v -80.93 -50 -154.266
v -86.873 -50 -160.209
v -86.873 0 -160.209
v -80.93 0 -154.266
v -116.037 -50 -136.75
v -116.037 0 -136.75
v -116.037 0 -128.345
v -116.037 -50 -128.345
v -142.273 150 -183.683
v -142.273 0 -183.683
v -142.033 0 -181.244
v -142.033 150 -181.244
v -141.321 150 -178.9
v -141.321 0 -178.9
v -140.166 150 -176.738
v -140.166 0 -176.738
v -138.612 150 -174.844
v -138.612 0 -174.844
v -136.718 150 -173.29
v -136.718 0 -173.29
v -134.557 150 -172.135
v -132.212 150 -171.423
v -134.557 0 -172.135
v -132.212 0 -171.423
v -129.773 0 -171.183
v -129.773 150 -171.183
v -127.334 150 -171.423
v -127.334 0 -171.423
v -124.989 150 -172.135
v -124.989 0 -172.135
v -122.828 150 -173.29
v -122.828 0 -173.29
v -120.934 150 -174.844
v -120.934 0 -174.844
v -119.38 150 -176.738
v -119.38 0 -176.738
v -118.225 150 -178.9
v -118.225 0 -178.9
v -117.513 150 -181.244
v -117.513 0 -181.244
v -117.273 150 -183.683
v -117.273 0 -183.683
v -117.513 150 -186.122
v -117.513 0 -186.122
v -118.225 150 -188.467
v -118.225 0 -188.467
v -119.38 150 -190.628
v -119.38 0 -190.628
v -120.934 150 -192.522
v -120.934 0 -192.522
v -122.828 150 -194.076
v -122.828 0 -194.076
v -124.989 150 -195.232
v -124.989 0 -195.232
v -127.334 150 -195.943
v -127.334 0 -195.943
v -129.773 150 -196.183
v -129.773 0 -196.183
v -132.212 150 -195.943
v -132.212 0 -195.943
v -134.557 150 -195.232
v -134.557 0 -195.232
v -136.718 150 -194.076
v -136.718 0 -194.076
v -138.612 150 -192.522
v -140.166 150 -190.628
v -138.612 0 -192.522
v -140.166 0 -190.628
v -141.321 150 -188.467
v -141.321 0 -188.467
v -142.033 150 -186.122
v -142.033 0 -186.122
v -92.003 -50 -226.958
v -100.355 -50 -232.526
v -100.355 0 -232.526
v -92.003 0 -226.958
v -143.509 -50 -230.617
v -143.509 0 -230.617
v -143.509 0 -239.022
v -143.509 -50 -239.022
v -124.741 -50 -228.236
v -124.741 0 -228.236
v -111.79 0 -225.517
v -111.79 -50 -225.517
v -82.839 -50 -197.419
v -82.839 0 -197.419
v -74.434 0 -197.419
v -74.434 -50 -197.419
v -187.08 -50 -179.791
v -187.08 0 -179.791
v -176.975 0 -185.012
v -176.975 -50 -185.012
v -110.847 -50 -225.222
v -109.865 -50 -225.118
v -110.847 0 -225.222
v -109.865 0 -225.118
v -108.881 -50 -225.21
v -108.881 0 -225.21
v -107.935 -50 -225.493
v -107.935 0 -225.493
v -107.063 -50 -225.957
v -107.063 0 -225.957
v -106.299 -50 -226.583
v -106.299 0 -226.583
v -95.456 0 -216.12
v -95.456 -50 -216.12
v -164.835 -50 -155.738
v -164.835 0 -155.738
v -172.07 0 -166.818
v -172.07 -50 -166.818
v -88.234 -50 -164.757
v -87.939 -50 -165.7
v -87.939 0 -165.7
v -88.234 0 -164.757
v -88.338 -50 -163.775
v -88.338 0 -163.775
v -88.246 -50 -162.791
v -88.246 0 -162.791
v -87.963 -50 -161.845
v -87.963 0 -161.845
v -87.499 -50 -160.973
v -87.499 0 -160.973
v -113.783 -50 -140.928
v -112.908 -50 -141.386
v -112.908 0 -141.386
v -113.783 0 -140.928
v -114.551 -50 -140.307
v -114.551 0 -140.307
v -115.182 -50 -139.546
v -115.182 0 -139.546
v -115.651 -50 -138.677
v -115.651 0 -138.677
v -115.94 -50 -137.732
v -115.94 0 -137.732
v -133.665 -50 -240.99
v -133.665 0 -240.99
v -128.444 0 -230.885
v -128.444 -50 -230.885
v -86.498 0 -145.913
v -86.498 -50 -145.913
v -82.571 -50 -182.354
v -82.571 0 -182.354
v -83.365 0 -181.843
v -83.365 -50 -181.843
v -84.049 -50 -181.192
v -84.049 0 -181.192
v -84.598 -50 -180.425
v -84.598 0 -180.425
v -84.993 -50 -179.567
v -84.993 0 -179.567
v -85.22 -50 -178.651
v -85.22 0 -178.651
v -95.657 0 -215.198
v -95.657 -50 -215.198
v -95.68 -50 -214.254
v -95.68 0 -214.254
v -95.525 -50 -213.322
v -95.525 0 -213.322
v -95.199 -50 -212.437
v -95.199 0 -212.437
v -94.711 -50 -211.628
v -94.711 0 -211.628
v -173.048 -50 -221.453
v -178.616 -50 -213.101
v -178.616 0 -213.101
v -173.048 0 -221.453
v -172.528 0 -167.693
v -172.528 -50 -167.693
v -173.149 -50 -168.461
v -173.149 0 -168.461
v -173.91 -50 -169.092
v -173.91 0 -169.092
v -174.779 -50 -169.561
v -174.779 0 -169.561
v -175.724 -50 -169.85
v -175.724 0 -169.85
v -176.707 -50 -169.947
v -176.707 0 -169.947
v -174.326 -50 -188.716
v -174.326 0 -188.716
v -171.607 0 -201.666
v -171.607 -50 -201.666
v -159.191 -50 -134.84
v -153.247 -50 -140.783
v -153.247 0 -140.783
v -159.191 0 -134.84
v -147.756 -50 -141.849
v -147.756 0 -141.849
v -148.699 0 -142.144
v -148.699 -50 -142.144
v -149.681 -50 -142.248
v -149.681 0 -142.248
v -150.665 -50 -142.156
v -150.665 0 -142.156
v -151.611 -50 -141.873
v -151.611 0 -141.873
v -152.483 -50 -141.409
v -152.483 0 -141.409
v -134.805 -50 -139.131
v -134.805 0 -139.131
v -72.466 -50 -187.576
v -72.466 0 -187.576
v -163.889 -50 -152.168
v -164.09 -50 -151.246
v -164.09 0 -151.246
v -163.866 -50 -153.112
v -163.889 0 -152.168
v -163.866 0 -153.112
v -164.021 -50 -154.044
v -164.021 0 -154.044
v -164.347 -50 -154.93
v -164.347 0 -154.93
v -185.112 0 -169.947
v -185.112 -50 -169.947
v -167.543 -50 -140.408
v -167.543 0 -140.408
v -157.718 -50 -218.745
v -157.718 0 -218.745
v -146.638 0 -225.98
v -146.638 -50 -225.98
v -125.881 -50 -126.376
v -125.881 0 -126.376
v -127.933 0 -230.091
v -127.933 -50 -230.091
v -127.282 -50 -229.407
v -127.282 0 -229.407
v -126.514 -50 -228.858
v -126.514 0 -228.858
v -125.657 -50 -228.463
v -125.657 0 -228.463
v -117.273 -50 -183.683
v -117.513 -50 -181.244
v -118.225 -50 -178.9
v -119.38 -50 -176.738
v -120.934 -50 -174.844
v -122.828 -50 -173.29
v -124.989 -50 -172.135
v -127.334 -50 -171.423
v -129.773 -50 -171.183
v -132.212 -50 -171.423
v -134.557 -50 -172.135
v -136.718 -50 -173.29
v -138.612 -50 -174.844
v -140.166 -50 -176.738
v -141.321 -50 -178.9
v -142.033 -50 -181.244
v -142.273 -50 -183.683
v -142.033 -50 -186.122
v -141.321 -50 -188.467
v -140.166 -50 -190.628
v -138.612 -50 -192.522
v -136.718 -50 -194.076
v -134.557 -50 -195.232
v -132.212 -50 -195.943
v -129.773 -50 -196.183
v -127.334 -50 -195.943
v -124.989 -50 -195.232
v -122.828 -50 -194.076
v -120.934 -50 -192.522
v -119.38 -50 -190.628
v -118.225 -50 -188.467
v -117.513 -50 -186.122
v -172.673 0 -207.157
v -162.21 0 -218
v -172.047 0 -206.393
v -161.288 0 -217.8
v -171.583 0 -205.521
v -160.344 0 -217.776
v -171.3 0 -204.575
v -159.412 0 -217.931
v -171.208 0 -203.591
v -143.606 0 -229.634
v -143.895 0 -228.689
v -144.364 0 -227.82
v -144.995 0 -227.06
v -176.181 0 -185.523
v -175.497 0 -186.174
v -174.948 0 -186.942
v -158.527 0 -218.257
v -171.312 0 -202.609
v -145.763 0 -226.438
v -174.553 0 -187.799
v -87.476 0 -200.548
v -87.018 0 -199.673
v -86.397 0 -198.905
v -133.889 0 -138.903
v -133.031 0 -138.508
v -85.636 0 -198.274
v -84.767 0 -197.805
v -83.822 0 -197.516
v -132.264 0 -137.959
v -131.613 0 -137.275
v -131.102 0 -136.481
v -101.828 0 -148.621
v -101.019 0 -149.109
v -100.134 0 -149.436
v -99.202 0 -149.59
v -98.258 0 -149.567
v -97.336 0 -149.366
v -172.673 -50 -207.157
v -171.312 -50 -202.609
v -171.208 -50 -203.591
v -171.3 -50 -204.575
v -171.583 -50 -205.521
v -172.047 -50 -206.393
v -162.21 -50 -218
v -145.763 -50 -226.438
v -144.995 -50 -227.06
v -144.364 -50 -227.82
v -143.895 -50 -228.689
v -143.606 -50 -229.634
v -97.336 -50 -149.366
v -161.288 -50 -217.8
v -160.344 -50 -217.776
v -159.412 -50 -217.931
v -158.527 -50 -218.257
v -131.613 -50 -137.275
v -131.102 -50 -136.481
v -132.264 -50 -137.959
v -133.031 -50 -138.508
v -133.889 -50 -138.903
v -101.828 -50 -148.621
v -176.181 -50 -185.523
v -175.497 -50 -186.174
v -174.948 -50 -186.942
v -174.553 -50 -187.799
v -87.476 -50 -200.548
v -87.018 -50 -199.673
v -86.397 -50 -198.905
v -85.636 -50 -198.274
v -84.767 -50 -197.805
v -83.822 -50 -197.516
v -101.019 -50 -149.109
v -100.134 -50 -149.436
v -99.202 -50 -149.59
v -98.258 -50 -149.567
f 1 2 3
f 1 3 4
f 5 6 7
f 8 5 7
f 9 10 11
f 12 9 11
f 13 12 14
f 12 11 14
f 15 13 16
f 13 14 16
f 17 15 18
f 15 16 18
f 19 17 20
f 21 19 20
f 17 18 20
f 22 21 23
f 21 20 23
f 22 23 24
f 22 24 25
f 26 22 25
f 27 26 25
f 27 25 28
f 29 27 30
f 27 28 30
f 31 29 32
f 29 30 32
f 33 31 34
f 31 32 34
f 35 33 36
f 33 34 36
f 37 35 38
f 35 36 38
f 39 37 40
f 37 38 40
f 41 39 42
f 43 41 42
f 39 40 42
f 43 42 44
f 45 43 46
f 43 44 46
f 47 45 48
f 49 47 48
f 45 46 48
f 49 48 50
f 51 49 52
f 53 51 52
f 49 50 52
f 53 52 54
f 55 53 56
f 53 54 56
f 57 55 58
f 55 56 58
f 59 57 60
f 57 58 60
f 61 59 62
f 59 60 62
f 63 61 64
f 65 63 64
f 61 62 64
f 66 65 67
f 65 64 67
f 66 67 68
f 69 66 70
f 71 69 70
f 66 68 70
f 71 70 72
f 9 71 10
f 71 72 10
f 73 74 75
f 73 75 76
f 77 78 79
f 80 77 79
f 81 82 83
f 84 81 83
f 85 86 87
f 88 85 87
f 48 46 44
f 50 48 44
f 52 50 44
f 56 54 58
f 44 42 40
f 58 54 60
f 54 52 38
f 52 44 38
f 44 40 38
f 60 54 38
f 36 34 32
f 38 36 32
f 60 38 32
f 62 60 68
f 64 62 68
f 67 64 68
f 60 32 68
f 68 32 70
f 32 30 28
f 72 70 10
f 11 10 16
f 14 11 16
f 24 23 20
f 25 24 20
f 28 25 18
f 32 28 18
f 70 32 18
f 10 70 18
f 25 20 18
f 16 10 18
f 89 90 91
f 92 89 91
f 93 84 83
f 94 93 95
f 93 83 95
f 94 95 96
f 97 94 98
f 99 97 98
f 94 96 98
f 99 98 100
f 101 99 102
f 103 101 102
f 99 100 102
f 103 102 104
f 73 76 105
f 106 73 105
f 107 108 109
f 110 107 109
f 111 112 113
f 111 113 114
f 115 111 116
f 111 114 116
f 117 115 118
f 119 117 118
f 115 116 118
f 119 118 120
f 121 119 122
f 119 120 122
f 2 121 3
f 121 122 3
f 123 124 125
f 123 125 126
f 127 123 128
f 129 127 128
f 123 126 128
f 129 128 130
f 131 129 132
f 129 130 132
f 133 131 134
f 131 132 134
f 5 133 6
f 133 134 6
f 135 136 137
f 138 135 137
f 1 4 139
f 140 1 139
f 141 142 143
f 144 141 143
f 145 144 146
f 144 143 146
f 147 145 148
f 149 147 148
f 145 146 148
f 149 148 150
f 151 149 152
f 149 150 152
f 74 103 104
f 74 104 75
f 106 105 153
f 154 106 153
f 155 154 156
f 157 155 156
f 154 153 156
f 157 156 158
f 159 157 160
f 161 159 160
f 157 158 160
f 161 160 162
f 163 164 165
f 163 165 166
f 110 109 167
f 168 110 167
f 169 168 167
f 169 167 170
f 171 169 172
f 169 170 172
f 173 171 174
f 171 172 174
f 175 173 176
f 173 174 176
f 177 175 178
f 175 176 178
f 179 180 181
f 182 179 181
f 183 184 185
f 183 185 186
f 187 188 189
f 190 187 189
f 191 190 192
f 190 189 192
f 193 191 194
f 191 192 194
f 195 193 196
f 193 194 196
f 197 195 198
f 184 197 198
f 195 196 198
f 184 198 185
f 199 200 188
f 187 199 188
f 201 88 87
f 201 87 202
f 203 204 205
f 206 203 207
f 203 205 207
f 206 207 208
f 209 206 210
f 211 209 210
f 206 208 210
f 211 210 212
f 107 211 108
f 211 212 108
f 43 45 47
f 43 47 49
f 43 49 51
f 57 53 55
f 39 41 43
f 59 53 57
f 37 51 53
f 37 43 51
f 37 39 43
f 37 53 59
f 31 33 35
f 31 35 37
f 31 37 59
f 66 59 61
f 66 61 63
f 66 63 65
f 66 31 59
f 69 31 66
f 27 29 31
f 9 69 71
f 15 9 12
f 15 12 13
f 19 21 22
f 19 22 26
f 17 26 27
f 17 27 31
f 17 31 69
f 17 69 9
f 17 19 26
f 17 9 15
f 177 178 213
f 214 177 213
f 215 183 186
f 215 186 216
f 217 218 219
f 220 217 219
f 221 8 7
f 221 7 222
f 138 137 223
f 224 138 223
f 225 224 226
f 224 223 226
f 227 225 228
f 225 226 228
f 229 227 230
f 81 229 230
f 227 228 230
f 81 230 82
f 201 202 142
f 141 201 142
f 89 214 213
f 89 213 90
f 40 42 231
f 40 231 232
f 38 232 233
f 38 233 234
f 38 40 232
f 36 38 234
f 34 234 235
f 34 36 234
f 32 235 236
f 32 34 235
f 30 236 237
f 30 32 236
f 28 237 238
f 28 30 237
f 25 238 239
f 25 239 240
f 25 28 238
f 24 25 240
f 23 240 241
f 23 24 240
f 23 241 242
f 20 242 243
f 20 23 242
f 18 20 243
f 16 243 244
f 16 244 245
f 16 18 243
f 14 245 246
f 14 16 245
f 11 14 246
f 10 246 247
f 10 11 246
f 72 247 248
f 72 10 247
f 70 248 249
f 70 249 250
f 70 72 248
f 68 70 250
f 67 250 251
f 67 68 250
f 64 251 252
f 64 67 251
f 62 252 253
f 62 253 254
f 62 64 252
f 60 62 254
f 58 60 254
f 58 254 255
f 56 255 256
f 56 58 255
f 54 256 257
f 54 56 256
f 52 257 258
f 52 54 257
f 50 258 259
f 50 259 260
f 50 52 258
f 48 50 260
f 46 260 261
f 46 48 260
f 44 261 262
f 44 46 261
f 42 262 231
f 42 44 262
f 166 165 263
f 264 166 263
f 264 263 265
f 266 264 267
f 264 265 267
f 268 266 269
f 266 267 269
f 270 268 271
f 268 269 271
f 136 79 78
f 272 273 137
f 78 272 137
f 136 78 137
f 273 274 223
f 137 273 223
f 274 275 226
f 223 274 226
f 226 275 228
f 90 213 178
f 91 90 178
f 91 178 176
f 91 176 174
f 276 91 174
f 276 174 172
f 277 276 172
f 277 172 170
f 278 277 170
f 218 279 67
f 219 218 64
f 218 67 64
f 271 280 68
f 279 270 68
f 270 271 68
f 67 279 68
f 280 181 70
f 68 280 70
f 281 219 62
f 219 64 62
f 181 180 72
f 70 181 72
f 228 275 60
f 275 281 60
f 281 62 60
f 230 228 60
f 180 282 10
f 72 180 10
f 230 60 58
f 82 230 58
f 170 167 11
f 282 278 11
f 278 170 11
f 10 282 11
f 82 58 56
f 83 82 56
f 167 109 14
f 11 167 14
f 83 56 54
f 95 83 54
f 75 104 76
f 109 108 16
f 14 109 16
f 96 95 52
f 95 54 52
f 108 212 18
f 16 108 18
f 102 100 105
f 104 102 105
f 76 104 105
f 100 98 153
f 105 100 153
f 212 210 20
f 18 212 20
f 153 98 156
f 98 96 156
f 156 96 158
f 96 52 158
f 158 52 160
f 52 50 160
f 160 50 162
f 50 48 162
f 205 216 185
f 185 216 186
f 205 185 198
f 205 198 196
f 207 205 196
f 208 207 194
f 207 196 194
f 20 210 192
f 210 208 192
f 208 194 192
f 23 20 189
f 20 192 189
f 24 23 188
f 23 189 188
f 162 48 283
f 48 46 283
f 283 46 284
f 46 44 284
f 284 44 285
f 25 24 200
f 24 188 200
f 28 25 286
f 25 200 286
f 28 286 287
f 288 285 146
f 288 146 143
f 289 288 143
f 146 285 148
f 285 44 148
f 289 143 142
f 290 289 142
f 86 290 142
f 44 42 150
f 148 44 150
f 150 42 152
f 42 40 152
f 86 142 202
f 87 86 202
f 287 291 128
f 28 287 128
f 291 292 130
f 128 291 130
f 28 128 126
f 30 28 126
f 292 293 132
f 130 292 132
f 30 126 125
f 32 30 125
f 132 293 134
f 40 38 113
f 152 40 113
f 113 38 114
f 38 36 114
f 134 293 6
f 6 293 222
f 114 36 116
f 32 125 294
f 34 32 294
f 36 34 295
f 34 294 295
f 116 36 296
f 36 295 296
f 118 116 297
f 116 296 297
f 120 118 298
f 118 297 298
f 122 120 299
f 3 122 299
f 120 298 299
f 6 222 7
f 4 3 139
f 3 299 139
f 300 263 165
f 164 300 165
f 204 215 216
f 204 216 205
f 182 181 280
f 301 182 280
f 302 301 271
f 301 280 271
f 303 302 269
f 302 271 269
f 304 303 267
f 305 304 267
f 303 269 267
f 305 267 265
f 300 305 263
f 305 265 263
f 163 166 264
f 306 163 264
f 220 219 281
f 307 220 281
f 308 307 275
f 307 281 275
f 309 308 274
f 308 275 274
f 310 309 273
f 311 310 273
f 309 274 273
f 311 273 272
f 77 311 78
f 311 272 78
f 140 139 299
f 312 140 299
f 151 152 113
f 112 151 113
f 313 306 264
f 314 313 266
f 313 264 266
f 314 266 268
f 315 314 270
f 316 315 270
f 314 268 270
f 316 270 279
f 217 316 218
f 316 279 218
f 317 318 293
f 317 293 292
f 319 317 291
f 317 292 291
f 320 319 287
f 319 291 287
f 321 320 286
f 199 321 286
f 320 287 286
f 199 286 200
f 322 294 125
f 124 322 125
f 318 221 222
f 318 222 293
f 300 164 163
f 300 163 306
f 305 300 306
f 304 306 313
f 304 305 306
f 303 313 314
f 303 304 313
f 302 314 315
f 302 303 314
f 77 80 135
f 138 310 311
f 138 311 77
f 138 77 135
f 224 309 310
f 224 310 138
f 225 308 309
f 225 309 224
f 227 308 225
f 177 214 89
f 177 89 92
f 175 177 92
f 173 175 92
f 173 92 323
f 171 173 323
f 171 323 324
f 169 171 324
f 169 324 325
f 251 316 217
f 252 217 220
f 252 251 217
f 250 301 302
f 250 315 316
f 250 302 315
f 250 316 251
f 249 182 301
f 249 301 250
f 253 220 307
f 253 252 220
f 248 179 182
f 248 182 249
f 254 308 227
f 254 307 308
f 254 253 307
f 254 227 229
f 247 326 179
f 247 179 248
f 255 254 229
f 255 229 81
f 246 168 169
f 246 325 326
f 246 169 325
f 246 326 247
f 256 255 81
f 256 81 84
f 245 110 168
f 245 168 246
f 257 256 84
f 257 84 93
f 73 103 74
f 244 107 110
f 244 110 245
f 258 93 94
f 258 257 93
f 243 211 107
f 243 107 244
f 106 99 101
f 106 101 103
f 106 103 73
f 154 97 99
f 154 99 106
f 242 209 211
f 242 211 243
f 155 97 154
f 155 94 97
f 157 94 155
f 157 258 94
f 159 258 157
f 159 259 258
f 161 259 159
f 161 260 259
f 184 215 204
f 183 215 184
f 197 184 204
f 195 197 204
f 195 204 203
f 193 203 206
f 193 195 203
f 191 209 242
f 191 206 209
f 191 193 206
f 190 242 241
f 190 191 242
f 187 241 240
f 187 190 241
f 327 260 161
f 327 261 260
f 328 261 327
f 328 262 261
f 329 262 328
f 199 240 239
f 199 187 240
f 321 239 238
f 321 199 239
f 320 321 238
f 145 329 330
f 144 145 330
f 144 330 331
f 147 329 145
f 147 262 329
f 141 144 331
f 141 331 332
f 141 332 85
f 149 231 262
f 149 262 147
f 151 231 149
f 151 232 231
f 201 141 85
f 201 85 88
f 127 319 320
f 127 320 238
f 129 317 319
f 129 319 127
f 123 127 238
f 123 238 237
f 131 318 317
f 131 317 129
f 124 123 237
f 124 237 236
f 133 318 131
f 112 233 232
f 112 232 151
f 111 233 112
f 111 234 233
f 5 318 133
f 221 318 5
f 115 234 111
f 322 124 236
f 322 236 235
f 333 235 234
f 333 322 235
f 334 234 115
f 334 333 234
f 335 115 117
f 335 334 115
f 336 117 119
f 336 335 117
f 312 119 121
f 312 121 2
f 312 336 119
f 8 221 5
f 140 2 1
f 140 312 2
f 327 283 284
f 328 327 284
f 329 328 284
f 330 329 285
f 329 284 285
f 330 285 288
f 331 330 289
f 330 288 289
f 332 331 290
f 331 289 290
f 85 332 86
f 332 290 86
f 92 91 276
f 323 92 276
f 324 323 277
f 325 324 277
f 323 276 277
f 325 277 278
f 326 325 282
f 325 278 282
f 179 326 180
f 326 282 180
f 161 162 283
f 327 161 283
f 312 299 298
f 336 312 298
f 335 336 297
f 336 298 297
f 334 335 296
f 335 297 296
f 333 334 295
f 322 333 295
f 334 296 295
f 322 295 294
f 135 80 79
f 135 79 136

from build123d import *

# Parameters (mm, degrees)
F0_R     = 12.5
F1_DEPTH = 50
F2_R     = 12.5
F3_DEPTH = 150


with BuildPart() as f1:
    # F0 (on Front) → F1 (new body)
    with BuildSketch(Plane.XZ):
        with BuildLine():
            Line((-116.0371901115, -128.3445464136), (-125.8805584276, -126.3758683266))
            Line((-125.8805584276, -126.3758683266), (-131.1020102552, -136.4806844073))
            ThreePointArc((-131.1020102552, -136.4806844073), (-132.6345582421, -138.2516897117), (-134.8054626168, -139.1305169507))
            Line((-134.8054626168, -139.1305169507), (-147.7560899978, -141.8494963995))
            ThreePointArc((-147.7560899978, -141.8494963995), (-150.6647489323, -142.156192832), (-153.2473327671, -140.7833781193))
            Line((-153.2473327671, -140.7833781193), (-159.1905657596, -134.8401451268))
            Line((-159.1905657596, -134.8401451268), (-167.5429438709, -140.4083919875))
            Line((-167.5429438709, -140.4083919875), (-164.0898838925, -151.2456999557))
            ThreePointArc((-164.0898838925, -151.2456999557), (-163.9212691063, -153.5816648901), (-164.8349056108, -155.738150795))
            Line((-164.8349056108, -155.738150795), (-172.0697732464, -166.8182360428))
            ThreePointArc((-172.0697732464, -166.8182360428), (-173.9096385759, -169.0918356267), (-176.7065277112, -169.9472715767))
            Line((-176.7065277112, -169.9472715767), (-185.1115284135, -169.9472715767))
            Line((-185.1115284135, -169.9472715767), (-187.0802065005, -179.7906398927))
            Line((-187.0802065005, -179.7906398927), (-176.9753904198, -185.0120917203))
            ThreePointArc((-176.9753904198, -185.0120917203), (-175.2043851154, -186.5446397072), (-174.3255578764, -188.715544082))
            Line((-174.3255578764, -188.715544082), (-171.6065784276, -201.6661714629))
            ThreePointArc((-171.6065784276, -201.6661714629), (-171.2998819951, -204.5748303975), (-172.6726967078, -207.1574142323))
            Line((-172.6726967078, -207.1574142323), (-178.6159297003, -213.1006472248))
            Line((-178.6159297003, -213.1006472248), (-173.0476828396, -221.4530253361))
            Line((-173.0476828396, -221.4530253361), (-162.2103748713, -217.9999653577))
            ThreePointArc((-162.2103748713, -217.9999653577), (-159.874409937, -217.8313505714), (-157.7179240321, -218.7449870759))
            Line((-157.7179240321, -218.7449870759), (-146.6378387843, -225.9798547115))
            ThreePointArc((-146.6378387843, -225.9798547115), (-144.3642392004, -227.8197200411), (-143.5088032504, -230.6166091763))
            Line((-143.5088032504, -230.6166091763), (-143.5088032504, -239.0216098787))
            Line((-143.5088032504, -239.0216098787), (-133.6654349344, -240.9902879657))
            Line((-133.6654349344, -240.9902879657), (-128.4439831068, -230.8854718849))
            ThreePointArc((-128.4439831068, -230.8854718849), (-126.9114351199, -229.1144665805), (-124.7405307451, -228.2356393415))
            Line((-124.7405307451, -228.2356393415), (-111.7899033642, -225.5166598928))
            ThreePointArc((-111.7899033642, -225.5166598928), (-108.8812444296, -225.2099634602), (-106.2986605948, -226.5827781729))
            Line((-106.2986605948, -226.5827781729), (-100.3554276023, -232.5260111654))
            Line((-100.3554276023, -232.5260111654), (-92.003049491, -226.9577643047))
            Line((-92.003049491, -226.9577643047), (-95.4561094694, -216.1204563365))
            ThreePointArc((-95.4561094694, -216.1204563365), (-95.6247242557, -213.7844914022), (-94.7110877512, -211.6280054973))
            Line((-94.7110877512, -211.6280054973), (-87.4762201156, -200.5479202495))
            ThreePointArc((-87.4762201156, -200.5479202495), (-85.636354786, -198.2743206655), (-82.8394656508, -197.4188847156))
            Line((-82.8394656508, -197.4188847156), (-74.4344649484, -197.4188847156))
            Line((-74.4344649484, -197.4188847156), (-72.4657868614, -187.5755163995))
            Line((-72.4657868614, -187.5755163995), (-82.5706029422, -182.3540645719))
            ThreePointArc((-82.5706029422, -182.3540645719), (-84.3416082466, -180.821516585), (-85.2204354856, -178.6506122103))
            Line((-85.2204354856, -178.6506122103), (-87.9394149343, -165.6999848293))
            ThreePointArc((-87.9394149343, -165.6999848293), (-88.2461113669, -162.7913258948), (-86.8732966542, -160.20874206))
            Line((-86.8732966542, -160.20874206), (-80.9300636616, -154.2655090675))
            Line((-80.9300636616, -154.2655090675), (-86.4983105224, -145.9131309562))
            Line((-86.4983105224, -145.9131309562), (-97.3356184906, -149.3661909346))
            ThreePointArc((-97.3356184906, -149.3661909346), (-99.6715834249, -149.5348057208), (-101.8280693298, -148.6211692163))
            Line((-101.8280693298, -148.6211692163), (-112.9081545776, -141.3863015807))
            ThreePointArc((-112.9081545776, -141.3863015807), (-115.1817541616, -139.5464362512), (-116.0371901115, -136.7495471159))
            Line((-116.0371901115, -136.7495471159), (-116.0371901115, -128.3445464136))
        make_face()
        with Locations((-129.772996681, -183.6830781461)):
            Circle(F0_R, mode=Mode.SUBTRACT)
    extrude(amount=F1_DEPTH)


with BuildPart() as f3:
    # F2 (on face) → F3 (new body)
    with BuildSketch(Plane(origin=(0, 0, 0), x_dir=(-1, 0, 0), z_dir=(0, 1, 0))):
        with Locations((129.772996681, -183.6830781461)):
            Circle(F2_R)
    extrude(amount=F3_DEPTH)


solid = Compound([f1.part, f3.part])
